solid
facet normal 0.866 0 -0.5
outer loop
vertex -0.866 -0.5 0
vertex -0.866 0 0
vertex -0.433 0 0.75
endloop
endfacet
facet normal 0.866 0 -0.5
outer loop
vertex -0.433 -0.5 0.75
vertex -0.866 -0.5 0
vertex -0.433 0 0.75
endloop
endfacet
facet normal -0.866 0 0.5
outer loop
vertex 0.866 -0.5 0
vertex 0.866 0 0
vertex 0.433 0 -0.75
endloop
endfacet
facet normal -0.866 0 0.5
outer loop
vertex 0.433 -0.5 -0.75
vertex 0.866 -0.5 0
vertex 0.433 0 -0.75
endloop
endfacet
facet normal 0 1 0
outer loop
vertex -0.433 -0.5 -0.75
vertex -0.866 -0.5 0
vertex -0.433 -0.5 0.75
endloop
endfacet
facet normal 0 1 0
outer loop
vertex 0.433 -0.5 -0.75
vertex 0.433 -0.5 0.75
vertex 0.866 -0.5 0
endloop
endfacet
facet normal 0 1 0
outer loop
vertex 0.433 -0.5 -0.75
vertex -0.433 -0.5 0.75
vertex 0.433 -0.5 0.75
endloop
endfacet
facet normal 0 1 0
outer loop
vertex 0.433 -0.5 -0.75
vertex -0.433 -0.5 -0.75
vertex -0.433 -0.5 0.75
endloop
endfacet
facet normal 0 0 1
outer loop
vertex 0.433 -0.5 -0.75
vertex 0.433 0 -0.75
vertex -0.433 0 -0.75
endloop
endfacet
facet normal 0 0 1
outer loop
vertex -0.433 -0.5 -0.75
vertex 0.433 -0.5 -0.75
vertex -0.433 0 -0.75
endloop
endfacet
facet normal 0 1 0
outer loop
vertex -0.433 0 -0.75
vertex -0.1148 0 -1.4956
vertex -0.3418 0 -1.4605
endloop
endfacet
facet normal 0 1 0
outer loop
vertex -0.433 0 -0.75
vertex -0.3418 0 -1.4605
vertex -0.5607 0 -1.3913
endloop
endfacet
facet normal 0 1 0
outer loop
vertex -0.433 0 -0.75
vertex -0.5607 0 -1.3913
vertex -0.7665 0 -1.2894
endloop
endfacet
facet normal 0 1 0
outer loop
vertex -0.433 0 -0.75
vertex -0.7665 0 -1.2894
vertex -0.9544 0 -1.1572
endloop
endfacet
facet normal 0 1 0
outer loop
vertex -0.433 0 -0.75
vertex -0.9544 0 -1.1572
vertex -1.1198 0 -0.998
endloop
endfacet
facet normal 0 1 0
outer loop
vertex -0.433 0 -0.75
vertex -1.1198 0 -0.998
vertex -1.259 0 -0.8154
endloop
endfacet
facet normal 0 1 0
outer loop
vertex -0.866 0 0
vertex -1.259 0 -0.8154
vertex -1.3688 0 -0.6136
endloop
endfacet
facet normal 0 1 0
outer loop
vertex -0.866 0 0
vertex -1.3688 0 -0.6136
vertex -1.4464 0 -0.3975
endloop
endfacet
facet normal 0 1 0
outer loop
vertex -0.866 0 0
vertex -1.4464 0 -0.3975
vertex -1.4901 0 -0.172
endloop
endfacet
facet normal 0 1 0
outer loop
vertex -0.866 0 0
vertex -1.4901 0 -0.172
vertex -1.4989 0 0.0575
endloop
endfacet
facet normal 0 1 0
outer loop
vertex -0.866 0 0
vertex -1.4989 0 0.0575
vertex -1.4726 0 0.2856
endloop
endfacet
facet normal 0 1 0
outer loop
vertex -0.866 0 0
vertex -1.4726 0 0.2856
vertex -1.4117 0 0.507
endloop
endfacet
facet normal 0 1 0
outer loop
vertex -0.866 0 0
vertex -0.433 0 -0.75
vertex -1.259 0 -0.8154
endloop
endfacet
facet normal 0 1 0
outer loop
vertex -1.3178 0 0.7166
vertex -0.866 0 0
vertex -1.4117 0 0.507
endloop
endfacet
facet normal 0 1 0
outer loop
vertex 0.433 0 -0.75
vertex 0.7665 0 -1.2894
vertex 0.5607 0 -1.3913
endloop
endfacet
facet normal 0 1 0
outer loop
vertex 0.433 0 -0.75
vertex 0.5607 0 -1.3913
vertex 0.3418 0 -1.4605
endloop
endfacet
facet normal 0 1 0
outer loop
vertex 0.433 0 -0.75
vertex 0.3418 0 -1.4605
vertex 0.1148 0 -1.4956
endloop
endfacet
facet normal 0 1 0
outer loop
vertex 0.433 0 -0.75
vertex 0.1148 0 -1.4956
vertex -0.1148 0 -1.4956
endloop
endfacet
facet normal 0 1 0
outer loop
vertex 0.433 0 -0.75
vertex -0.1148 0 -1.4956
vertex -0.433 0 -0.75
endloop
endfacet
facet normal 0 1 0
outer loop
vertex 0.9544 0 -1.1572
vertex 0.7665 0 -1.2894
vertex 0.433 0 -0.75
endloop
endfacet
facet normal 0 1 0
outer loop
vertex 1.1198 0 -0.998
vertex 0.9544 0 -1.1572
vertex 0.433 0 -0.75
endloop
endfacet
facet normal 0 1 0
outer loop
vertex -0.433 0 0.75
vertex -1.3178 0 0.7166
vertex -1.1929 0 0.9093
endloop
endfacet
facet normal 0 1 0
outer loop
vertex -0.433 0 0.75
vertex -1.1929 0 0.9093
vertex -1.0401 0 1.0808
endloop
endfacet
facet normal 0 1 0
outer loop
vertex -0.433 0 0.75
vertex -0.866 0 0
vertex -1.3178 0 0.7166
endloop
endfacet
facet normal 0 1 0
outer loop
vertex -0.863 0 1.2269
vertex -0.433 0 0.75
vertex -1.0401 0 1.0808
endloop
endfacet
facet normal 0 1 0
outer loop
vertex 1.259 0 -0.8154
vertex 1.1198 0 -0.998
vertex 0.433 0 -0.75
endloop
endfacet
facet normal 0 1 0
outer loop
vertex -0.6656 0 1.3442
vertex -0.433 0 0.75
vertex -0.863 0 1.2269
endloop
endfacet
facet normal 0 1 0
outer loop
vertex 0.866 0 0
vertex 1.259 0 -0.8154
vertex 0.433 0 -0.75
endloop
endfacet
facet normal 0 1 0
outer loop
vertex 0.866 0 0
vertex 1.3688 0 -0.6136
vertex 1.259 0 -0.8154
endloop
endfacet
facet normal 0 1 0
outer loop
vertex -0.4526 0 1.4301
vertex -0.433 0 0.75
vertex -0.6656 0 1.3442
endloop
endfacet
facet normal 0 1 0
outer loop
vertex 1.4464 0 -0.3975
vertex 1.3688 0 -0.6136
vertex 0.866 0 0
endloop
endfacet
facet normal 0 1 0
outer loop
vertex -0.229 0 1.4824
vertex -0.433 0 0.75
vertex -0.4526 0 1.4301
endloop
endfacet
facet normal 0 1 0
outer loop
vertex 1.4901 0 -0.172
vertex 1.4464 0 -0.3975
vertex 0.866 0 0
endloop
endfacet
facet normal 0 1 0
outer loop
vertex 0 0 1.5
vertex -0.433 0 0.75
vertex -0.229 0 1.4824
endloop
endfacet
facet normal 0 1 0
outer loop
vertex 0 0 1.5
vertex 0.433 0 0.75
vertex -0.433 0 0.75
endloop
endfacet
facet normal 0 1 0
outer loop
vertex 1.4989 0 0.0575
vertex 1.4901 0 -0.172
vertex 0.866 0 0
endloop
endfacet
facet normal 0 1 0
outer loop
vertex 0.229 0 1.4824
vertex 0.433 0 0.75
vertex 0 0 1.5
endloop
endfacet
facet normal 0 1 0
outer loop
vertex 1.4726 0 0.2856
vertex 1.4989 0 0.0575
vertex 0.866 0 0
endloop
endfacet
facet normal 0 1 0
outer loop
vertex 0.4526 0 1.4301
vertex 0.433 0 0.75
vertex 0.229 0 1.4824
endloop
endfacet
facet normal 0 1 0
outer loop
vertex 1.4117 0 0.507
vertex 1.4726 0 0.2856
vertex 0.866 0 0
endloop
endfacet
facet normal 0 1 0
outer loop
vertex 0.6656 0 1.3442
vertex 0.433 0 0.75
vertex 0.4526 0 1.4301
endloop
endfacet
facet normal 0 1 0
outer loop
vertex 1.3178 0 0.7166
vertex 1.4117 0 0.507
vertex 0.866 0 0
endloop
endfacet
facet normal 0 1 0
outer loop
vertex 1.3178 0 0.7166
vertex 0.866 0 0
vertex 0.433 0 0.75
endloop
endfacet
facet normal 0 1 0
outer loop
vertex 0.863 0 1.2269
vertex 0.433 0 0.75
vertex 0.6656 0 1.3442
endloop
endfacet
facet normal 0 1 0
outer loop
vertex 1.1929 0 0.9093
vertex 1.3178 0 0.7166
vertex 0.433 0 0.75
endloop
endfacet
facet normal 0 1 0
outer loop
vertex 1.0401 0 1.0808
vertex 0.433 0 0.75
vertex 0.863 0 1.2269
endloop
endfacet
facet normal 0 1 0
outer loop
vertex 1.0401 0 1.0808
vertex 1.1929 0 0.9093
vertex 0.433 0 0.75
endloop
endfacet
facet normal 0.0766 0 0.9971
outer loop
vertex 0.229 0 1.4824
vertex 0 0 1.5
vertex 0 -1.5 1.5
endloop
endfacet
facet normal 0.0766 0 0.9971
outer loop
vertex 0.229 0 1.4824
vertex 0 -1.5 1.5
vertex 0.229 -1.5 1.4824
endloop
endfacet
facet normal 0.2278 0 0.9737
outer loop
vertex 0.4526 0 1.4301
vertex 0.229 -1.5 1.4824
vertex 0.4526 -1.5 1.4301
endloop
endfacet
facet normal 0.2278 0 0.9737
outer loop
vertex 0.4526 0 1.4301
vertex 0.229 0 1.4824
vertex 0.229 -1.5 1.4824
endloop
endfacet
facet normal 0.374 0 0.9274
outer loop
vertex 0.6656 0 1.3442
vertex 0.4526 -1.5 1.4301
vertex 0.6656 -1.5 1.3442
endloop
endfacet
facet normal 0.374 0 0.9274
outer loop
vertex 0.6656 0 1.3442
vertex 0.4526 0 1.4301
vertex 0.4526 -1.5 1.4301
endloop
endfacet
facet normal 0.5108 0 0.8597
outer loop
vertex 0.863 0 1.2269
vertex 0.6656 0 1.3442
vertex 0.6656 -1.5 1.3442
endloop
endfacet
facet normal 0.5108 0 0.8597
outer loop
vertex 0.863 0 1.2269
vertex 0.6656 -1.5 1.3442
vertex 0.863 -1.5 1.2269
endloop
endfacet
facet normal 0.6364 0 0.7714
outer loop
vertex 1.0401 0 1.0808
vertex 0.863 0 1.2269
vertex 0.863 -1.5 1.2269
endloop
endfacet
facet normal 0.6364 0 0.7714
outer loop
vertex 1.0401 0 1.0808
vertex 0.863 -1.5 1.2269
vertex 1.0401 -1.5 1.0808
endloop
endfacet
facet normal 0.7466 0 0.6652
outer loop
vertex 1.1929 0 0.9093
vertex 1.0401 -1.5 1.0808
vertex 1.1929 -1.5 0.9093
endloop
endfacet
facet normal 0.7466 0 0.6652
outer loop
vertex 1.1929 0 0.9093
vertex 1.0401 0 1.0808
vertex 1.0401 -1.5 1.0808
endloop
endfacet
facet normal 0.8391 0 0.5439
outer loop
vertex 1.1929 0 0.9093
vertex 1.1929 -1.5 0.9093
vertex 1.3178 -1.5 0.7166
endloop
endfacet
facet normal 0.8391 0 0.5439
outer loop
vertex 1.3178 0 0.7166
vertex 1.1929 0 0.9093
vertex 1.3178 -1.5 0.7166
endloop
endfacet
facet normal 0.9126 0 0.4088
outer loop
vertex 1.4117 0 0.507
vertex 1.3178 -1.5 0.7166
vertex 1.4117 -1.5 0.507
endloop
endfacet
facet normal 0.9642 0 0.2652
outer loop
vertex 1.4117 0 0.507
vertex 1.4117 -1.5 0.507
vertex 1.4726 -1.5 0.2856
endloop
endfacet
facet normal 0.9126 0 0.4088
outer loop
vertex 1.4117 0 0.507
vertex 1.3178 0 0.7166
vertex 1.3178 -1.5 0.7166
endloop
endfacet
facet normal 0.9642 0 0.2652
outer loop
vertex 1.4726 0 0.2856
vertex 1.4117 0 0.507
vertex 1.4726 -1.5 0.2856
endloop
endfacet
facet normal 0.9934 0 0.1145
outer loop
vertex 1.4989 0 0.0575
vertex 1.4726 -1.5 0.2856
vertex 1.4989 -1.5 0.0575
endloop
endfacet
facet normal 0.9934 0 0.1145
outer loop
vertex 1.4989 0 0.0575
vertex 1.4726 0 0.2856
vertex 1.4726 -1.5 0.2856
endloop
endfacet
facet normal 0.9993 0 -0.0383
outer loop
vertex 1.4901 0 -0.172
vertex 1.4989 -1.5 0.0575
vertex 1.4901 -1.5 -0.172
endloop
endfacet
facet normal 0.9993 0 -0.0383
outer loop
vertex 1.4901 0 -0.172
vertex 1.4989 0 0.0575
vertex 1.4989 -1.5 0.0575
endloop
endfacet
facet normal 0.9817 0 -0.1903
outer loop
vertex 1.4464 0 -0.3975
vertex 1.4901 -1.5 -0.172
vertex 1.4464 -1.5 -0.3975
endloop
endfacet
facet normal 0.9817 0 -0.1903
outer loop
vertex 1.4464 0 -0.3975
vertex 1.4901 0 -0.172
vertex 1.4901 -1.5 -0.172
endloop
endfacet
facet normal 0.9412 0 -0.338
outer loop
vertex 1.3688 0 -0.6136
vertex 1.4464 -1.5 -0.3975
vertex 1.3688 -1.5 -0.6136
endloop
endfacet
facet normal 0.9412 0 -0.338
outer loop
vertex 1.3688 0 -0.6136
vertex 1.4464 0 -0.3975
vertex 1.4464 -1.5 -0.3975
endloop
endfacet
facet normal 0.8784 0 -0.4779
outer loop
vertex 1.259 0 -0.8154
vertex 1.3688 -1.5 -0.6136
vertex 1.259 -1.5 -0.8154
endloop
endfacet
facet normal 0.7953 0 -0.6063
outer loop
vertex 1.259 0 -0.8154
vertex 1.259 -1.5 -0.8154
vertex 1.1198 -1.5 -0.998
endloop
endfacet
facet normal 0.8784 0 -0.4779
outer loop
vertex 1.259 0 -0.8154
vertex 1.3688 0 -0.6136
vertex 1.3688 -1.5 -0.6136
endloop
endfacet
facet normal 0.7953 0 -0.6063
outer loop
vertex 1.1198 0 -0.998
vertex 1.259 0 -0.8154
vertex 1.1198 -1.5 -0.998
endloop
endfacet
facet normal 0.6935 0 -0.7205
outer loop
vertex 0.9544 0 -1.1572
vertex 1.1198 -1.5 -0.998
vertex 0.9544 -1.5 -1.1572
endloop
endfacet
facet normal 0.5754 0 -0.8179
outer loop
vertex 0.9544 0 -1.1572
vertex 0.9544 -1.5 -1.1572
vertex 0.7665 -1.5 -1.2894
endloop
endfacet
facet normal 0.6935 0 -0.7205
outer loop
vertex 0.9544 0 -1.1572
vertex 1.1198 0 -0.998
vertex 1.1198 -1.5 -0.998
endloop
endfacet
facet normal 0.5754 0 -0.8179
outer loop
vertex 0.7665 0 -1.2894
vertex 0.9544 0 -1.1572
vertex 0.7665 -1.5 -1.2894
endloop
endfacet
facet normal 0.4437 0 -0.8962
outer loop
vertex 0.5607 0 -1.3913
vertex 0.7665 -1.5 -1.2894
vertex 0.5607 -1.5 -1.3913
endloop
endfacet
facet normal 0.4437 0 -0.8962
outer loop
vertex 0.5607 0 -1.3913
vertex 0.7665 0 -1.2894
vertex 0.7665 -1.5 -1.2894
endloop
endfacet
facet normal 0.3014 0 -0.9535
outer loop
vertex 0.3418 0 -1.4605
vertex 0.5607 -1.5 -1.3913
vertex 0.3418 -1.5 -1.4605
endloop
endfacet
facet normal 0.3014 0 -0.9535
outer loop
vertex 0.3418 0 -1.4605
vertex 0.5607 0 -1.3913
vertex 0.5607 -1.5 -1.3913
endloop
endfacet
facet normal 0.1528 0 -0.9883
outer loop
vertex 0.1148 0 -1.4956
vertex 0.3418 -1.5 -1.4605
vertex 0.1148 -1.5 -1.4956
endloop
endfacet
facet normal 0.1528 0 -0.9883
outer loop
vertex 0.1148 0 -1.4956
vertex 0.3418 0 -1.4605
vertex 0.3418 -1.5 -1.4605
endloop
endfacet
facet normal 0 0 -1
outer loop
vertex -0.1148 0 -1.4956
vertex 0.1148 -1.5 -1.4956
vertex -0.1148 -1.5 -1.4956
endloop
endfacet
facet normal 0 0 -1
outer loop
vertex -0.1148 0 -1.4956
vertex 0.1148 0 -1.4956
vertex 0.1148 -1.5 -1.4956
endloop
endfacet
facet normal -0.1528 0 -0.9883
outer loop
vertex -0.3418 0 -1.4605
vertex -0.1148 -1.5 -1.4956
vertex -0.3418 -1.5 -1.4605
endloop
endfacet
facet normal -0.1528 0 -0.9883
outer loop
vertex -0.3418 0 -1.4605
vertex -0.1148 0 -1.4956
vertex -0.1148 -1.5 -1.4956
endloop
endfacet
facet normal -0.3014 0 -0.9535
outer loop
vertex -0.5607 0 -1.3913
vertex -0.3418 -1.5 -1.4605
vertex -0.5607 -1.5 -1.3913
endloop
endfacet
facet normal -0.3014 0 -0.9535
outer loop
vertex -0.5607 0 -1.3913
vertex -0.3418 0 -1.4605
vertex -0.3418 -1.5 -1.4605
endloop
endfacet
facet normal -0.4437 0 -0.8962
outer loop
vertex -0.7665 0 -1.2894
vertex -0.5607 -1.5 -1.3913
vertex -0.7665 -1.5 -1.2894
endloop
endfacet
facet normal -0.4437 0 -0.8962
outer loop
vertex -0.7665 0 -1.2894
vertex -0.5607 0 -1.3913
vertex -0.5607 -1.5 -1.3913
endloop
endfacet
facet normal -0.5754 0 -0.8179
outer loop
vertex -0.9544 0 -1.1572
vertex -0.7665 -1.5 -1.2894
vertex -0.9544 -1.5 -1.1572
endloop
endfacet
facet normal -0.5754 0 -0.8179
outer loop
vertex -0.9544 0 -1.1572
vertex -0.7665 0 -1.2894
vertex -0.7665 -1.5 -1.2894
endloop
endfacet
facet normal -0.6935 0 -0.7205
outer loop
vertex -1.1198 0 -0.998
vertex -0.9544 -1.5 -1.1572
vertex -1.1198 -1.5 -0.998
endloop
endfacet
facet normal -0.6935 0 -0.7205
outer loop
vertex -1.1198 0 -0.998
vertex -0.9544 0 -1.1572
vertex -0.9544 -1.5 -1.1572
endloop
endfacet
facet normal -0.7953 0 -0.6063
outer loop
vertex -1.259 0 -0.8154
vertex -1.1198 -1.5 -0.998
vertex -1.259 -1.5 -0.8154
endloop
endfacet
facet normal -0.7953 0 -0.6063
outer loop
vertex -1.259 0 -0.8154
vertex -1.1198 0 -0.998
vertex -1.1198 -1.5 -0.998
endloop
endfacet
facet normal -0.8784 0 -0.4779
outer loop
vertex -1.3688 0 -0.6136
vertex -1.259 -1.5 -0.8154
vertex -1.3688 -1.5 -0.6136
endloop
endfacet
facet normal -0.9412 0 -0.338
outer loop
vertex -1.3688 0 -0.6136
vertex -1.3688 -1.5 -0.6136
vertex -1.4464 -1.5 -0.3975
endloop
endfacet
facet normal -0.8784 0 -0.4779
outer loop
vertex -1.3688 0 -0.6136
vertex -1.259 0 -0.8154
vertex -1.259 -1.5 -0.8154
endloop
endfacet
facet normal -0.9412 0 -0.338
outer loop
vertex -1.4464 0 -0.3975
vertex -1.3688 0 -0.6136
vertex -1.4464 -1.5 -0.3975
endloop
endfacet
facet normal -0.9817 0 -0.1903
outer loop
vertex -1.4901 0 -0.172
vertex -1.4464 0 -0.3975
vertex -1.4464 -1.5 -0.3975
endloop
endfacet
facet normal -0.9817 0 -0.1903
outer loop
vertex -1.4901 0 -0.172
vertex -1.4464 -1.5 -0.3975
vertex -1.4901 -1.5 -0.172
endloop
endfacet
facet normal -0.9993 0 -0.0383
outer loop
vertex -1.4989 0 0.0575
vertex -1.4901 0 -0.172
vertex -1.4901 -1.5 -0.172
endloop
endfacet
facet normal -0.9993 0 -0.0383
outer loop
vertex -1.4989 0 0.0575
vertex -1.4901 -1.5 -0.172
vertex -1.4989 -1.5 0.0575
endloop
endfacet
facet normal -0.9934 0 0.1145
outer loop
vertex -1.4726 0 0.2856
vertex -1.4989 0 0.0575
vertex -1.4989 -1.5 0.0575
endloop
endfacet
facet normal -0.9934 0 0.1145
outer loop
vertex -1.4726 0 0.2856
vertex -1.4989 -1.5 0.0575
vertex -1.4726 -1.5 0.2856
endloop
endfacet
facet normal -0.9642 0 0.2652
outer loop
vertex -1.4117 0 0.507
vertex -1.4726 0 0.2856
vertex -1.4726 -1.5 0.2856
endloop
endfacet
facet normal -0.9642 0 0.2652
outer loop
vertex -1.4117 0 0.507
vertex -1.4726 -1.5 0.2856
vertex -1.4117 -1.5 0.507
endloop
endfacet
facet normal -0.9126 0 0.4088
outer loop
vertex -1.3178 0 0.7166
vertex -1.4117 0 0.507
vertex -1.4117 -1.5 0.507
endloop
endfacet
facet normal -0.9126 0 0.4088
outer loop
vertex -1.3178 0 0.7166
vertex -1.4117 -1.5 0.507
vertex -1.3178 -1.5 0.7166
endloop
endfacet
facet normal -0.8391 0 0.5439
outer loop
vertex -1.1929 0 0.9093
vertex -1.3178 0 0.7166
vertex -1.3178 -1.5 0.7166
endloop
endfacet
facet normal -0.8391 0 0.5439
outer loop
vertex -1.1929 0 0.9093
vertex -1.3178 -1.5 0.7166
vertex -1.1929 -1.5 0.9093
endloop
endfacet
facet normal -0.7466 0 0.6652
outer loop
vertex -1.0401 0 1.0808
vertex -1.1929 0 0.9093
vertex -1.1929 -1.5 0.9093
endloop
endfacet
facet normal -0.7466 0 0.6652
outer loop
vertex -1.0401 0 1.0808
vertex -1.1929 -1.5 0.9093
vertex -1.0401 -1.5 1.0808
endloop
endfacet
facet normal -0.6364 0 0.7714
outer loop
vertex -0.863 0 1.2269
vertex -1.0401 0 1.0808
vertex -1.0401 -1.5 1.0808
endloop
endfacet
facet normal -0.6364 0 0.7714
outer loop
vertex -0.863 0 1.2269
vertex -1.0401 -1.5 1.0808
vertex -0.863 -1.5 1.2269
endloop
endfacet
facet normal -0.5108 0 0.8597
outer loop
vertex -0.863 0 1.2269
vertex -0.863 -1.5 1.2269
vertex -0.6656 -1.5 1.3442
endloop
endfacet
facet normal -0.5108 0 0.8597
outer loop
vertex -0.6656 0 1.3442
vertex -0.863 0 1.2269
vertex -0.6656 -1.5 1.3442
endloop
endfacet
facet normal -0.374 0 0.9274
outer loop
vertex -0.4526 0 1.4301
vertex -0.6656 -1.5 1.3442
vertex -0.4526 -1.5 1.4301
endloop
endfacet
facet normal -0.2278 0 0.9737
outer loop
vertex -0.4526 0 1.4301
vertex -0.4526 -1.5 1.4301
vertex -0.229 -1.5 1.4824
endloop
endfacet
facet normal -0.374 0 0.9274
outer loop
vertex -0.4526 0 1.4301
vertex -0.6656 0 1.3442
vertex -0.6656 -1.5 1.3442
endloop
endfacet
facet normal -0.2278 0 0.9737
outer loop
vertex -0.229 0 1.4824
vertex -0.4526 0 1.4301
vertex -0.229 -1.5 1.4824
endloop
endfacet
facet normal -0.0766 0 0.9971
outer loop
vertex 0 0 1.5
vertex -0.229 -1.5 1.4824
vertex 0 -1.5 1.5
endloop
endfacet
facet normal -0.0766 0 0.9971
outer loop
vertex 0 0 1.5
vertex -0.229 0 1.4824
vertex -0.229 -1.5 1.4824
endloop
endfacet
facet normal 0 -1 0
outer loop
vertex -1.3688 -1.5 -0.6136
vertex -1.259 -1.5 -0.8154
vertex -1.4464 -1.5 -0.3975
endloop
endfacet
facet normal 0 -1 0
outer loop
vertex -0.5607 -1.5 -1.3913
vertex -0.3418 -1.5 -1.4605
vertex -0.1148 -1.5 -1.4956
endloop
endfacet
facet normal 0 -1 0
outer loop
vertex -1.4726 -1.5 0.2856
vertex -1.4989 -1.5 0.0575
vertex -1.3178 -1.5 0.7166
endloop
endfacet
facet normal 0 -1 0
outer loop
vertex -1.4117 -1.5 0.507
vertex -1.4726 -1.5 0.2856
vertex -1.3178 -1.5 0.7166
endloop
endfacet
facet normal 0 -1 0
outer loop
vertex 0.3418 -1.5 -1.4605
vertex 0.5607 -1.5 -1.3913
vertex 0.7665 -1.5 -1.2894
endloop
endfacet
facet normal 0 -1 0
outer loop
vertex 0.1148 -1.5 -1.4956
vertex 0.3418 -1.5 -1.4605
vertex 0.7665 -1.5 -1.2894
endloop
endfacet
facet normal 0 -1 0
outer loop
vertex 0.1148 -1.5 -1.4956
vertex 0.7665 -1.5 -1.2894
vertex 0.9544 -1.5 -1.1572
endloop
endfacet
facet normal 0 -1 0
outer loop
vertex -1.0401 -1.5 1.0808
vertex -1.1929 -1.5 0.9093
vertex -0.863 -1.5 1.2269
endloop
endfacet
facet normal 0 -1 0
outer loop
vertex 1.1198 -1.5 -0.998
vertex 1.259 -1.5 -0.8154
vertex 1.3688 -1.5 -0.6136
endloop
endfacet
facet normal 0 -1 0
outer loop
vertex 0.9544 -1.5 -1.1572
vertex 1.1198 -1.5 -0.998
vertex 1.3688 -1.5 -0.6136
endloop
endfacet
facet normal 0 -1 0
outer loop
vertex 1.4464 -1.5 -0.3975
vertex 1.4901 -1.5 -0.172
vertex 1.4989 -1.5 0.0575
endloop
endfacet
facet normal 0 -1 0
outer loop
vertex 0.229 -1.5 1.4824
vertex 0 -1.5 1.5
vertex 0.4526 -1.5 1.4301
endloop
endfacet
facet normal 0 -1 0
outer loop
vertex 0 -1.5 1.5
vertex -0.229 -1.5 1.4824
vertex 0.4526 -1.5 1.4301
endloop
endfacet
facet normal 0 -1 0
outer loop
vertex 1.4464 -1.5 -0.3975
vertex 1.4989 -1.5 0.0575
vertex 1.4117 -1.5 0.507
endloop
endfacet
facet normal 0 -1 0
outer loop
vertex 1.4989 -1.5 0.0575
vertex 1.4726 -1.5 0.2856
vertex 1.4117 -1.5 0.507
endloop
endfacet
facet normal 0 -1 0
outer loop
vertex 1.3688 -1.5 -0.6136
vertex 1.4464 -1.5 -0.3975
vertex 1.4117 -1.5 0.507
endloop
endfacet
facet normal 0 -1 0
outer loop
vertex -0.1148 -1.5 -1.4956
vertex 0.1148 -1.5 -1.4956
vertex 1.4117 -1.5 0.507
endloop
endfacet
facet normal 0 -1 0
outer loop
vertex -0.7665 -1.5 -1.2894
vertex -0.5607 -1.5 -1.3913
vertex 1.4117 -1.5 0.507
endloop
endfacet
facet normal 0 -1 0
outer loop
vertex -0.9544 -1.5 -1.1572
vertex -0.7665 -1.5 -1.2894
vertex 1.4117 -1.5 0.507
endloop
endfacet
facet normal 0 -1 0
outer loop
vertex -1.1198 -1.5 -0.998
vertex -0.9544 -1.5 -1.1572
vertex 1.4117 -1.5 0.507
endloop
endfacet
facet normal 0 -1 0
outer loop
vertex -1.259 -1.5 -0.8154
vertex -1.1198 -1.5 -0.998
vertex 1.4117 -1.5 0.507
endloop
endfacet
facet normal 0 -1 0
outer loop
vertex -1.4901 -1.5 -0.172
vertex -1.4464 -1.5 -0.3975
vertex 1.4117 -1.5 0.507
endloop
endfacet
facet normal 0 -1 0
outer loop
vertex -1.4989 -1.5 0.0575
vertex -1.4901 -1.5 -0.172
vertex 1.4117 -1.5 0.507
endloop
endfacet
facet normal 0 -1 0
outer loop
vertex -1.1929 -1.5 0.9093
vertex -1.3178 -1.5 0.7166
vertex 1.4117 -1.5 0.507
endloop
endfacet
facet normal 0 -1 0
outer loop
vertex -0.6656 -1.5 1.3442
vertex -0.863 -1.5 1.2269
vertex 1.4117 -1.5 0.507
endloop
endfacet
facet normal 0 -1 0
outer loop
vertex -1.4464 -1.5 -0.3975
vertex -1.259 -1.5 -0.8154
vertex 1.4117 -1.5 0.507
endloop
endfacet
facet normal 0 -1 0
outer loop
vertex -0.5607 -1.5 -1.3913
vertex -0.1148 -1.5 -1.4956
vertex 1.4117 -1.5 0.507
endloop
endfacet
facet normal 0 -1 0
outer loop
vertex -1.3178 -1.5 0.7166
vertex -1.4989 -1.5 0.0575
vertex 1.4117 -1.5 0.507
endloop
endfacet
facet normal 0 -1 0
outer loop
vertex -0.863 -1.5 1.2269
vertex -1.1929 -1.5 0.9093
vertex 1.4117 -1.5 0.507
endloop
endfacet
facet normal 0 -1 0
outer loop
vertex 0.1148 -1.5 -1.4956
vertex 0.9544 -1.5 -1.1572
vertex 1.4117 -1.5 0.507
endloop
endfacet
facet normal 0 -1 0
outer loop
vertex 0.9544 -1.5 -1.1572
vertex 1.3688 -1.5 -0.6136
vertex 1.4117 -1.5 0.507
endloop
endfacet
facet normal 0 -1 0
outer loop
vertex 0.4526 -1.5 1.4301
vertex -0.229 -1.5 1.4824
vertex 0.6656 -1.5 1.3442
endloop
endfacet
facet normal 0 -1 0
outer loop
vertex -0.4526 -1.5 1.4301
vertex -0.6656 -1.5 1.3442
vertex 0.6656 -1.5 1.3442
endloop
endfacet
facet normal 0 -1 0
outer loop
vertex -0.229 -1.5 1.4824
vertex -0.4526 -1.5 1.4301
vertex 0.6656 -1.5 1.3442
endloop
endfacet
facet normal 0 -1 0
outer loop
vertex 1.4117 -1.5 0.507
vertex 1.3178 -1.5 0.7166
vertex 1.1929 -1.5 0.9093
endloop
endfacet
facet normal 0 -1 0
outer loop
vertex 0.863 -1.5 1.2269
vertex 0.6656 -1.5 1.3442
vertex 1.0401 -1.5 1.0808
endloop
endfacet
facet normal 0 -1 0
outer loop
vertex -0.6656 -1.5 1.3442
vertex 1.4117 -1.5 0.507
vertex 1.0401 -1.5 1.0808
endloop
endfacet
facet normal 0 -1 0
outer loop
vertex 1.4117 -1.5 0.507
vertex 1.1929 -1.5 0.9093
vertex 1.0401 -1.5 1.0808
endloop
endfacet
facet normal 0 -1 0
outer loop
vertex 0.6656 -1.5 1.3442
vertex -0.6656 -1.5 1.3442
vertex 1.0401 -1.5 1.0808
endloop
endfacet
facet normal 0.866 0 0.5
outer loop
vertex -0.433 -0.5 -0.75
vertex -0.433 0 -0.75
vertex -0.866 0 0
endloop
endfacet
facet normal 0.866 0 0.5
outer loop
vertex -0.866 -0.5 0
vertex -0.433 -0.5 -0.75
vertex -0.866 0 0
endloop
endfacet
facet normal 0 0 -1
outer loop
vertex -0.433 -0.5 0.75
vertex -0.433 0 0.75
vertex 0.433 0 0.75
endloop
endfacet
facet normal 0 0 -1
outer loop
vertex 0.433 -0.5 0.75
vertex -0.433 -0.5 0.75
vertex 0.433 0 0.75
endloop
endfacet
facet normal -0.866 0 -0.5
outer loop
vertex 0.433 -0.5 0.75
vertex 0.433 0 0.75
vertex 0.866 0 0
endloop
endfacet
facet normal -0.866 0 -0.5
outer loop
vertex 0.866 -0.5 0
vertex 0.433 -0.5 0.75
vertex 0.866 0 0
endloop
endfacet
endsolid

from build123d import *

# Parameters (mm, degrees)
SKETCH_1_R          = 1.5
EXTRUDE_1_DEPTH     = 1.5
CUT_EXTRUDE_1_DEPTH = 0.5


with BuildPart() as part:
    # 草图1 → 凸台-拉伸1 (new body)
    with BuildSketch(Plane(origin=(0, 0, 0), x_dir=(1, 0, 0), z_dir=(0, 1, 0))):
        with Locations(Location((0, 0, 0), (0, 0, 270))):
            Circle(SKETCH_1_R)
    extrude(amount=-EXTRUDE_1_DEPTH)

    # 草图2 → 切除-拉伸1 (cut)
    with BuildSketch(Plane(origin=(0, 0, 0), x_dir=(1, 0, 0), z_dir=(0, 1, 0))):
        Polygon((0.433012702, -0.75), (0.866025404, 0), (0.433012702, 0.75), (-0.433012702, 0.75), (-0.866025404, 0), (-0.433012702, -0.75), align=None)
    extrude(amount=-CUT_EXTRUDE_1_DEPTH, mode=Mode.SUBTRACT)


solid = part.part
